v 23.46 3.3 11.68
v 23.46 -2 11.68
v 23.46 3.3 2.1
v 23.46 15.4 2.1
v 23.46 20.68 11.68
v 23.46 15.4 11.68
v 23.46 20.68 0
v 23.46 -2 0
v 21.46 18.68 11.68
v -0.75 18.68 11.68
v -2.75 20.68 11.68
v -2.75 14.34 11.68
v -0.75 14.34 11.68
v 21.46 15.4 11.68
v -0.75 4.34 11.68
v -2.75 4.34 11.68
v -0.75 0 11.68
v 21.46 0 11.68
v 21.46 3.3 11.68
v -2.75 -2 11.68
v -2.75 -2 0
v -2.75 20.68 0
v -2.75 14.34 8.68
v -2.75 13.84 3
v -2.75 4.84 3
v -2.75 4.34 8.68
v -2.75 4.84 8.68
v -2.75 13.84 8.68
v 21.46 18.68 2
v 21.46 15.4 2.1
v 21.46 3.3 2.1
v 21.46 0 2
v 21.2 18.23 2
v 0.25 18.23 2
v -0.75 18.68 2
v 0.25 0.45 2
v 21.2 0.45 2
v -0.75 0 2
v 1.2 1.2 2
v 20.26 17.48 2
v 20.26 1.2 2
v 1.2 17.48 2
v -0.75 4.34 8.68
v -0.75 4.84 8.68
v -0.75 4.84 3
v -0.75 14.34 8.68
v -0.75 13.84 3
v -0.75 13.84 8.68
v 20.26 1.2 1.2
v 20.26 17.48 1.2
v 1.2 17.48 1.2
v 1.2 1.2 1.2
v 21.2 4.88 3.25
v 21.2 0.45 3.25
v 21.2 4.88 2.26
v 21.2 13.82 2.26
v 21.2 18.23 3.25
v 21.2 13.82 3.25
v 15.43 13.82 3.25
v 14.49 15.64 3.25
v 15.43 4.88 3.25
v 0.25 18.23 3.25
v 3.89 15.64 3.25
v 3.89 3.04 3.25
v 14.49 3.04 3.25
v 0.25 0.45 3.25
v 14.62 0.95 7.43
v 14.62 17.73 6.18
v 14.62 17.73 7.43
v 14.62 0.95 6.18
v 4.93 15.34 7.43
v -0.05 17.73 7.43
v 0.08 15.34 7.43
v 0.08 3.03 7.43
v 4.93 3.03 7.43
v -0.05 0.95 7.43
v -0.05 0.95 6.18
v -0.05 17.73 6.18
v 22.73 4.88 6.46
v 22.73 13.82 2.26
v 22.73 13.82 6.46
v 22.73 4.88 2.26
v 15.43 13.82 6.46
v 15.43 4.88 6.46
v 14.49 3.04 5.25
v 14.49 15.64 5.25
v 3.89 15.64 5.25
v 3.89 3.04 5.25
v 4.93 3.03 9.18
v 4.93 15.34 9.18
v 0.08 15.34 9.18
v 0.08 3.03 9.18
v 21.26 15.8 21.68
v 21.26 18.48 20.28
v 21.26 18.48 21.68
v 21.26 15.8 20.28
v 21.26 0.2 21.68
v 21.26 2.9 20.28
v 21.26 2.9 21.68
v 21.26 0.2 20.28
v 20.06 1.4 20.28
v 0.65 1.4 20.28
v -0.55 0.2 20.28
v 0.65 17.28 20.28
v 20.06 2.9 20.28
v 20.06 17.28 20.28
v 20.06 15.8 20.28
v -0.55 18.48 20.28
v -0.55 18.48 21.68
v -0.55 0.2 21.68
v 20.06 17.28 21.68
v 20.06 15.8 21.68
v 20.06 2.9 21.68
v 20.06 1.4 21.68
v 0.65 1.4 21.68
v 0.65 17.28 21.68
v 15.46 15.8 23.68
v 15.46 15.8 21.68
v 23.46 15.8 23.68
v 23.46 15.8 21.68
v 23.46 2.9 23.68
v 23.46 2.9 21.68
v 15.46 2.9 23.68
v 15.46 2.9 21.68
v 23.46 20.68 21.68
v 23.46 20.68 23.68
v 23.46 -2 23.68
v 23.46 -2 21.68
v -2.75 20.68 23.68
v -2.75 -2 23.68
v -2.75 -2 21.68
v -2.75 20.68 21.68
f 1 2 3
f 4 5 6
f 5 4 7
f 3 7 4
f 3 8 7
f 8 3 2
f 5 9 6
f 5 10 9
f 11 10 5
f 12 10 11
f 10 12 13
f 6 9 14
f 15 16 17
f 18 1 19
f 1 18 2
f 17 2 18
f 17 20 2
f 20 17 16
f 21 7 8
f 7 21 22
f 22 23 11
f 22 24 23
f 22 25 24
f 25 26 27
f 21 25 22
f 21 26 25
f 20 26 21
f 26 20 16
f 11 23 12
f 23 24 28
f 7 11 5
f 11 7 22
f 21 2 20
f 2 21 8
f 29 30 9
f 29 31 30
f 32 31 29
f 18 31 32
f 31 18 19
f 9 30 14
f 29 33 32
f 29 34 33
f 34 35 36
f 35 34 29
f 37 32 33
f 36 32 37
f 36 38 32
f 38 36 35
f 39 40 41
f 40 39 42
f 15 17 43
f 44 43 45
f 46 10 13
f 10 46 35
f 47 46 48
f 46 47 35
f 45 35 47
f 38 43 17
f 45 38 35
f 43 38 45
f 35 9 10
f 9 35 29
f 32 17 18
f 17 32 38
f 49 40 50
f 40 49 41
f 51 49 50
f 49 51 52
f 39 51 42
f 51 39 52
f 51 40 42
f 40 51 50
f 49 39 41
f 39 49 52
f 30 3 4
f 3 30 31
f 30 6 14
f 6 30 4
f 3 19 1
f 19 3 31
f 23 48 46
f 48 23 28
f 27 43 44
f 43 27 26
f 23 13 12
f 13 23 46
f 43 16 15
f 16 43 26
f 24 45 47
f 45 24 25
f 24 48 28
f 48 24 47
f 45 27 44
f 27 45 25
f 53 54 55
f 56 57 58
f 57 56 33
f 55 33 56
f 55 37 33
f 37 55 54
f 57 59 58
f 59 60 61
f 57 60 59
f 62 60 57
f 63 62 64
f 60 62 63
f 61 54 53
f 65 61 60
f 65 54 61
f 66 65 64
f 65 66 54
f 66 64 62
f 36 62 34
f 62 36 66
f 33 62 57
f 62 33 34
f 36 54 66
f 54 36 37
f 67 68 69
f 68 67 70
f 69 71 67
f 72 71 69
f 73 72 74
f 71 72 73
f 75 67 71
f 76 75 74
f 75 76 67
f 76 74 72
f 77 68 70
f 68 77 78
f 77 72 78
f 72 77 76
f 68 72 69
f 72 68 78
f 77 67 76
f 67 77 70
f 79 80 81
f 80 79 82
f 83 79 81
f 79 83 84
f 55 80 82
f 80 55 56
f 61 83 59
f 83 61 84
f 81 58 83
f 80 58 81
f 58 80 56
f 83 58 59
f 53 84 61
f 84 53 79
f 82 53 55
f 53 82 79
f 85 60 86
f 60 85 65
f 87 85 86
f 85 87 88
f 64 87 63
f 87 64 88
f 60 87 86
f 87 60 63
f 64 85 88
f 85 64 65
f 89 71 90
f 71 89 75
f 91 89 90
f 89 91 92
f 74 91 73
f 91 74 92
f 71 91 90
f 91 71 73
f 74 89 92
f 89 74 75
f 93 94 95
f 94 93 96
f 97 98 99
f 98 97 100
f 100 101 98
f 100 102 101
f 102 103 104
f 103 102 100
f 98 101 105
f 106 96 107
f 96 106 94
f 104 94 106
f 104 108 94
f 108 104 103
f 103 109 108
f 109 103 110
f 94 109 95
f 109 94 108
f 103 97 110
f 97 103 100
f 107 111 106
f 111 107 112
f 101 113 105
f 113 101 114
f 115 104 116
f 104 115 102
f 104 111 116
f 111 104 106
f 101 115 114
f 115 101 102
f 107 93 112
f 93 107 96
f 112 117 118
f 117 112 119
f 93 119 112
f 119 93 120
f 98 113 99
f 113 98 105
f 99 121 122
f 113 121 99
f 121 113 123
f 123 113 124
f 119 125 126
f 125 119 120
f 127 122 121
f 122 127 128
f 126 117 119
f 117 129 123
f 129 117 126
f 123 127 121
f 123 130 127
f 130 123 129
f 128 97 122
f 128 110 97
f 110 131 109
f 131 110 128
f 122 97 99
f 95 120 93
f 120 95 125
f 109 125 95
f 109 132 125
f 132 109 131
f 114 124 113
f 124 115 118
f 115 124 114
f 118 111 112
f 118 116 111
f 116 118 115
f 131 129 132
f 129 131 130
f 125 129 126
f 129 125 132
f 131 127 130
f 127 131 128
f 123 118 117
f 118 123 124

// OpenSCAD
// 2026-10-16 V6.5 release: USB and SD openings each 0.6 mm wider.
// V6.4 case pocket, outline, seating height and flat tape-mount base retained.
// Prior fitted print bowed around the board; add 0.2 mm on each side.
// Print body flat base down and lid flat roof down. No underside rails.
// Ryan approved the V6.4 fit apart from tight port openings.
// V6.5 final port widening is CAD-verified; a new physical print is untested.
part = "exploded"; // body, lid, body_preview, fit_preview, assembly, exploded, collision
board_clearance = 0.25; // retain existing length clearance
extra_width = 0.40; // V6.4 adds 0.20 mm on each side of the board
rear_cable_width = 9; // +1 mm versus nearly fitting v4.3
rear_cable_bottom = 3; // 1 mm above the board's seating ledge
side_wire_exits = false; // Ryan requested cable exit opposite USB; keep sides solid
wall = 2.0;
floor_t = 2;
rail_h = 0; // flat continuous underside for mounting tape
pcb_l = 20.96;
pcb_w = 17.78;
pl = pcb_l + 2*board_clearance;
pw = pcb_w + 2*board_clearance + extra_width;
// Sense PCB overhangs the rear of the main PCB by 0.30 mm.
rear_extra = 0.75; // +0.4 mm pocket depth at cable end; PCB ledge unchanged
x0 = -wall-rear_extra;
x1 = pl+wall;
y0 = -wall;
y1 = pw+wall;
fpc_top = floor_t+6.93+0.25;
height_reduction = 1.0;
body_top = fpc_top+3.5-height_reduction;
lid_gap = 0.20; // internal locating lip clearance per side; not a snap fit
lid_t = 2;
seat_gap = 0; // roof underside rests on the body's top rim
lid_under = body_top+seat_gap;
lid_top = lid_under+lid_t;
lip_depth = 1.4; // lip bottom remains 1.1 mm above tallest reference connector
lip_wall = 1.2;
skirt_bottom = body_top-lip_depth;
usb_y = board_clearance+extra_width/2+2.78-((-10.59-1.65)/2);
usb_width = 12.1; // V6.5: +0.6 mm total, +0.3 mm per side
card_relief_width = usb_width+0.8; // V6.5: 12.9 mm, +0.6 mm total
card_access_depth = 8; // 3 mm deeper than V6.2; check physical access before bonding
usb_bottom = 2.1; // sill raised just 0.2 mm; below modeled connector bottom 2.26 mm
usb_top = 6.9;
wire_top = 6.6;
wire_ranges = [[pl/2+3.9,pl/2+8.8],[pl/2-8.8,pl/2-6.4]];
window_w = 10;
window_bottom = body_top-3;
eps = 0.02;
$fn = 40;

module body() {
  difference() {
    // Single flat-bottom shell; no feet or rails under the tape surface.
    translate([x0,y0,0]) cube([x1-x0,y1-y0,body_top]);
    // Full-depth pocket. Bottom board rests on the original perimeter ledge.
    translate([-rear_extra,0,floor_t])
      cube([pl+rear_extra,pw,body_top]);
    translate([1.2,1.2,floor_t-0.8]) cube([pl-2.4,pw-2.4,body_top]);
    // Top-open USB/card notch restores drop-in installation and card clearance.
    // V6.5 width 12.1 mm; actual card/cable access still needs a physical check.
    translate([pl-eps,usb_y-usb_width/2,usb_bottom])
      cube([wall+2*eps,usb_width,body_top]);
    // Top-open harness slots avoid threading soldered wires through closed holes.
    if(side_wire_exits) for(r=wire_ranges, side=[0,1])
      translate([r[0],side?pw-eps:y0-eps,floor_t+1])
        cube([r[1]-r[0],wall+2*eps,body_top]);
    // Rear foam inlet is an open-top notch capped by the lid (no TPU bridge).
    translate([x0-eps,(pw-window_w)/2,window_bottom])
      cube([wall+2*eps,window_w,body_top]);
    // Harness exit at -X, directly opposite the USB end. Open at the top so
    // the already-soldered recorder/harness can settle into the bottom.
    translate([x0-eps,(pw-rear_cable_width)/2,rear_cable_bottom])
      cube([wall+2*eps,rear_cable_width,body_top]);
  }
}

module lid() {
  difference() {
  union() {
    // Roof has exactly the body's outside width and length. Its underside
    // rests on the 2 mm body rim, leaving no overhanging outer skirt.
    translate([x0,y0,lid_under]) cube([x1-x0,y1-y0,lid_t]);
    // Small male locating lip fits inside the body pocket (a groove/rabbet
    // around its perimeter). Continuous rear edge: no wire slot in the lid.
    difference() {
      translate([-rear_extra+lid_gap,lid_gap,skirt_bottom])
        cube([pl+rear_extra-2*lid_gap,pw-2*lid_gap,lip_depth+eps]);
      translate([-rear_extra+lid_gap+lip_wall,lid_gap+lip_wall,skirt_bottom-eps])
        cube([pl+rear_extra-2*(lid_gap+lip_wall),pw-2*(lid_gap+lip_wall),lip_depth+3*eps]);
      // Remove the internal front lip above the USB/card notch.
      // The roof access cut below keeps the card accessible after bonding.
      translate([pl-lid_gap-lip_wall-0.3,usb_y-card_relief_width/2,skirt_bottom-eps])
        cube([wall+lid_gap+lip_wall+1,card_relief_width,lip_depth+3*eps]);
    }
    // Reference connector top is z=9.18; lip bottom is z=10.28. Actual
    // solder/wires and inserted card still require a physical clearance check.
  }
  // Through-roof, edge-open card access. Removes both roof and locating lip
  // over the card end; side shoulders and rear lip remain for location/bonding.
  translate([x1-card_access_depth,usb_y-card_relief_width/2,skirt_bottom-eps])
    cube([card_access_depth+eps,card_relief_width,lid_top-skirt_bottom+2*eps]);
  }
}

// Simplified visual board only; never included in either printable export.
module step_box(a,b,c,d,e,f) {
  translate([board_clearance+a+8.67,board_clearance+extra_width/2+2.78-f,floor_t+c+0.25])
    cube([b-a,f-e,d-c]);
}
module board() {
  color("seagreen") step_box(-8.67,12.28,-0.25,1,-15,2.78);
  color("seagreen") step_box(-8.97,5.70,3.93,5.18,-14.50,2.28);
  color("silver") step_box(6.51,13.81,0.01,4.21,-10.59,-1.65);
  color("silver") step_box(-5.03,5.57,1,3,-12.41,0.19);
  color("ivory") step_box(-8.84,-3.99,5.17,6.93,-12.11,0.20);
}
if(part=="body") translate([0,0,rail_h]) body();
if(part=="body_preview") color([0.25,0.45,0.7]) body();
if(part=="fit_preview") {
  color([0.25,0.45,0.7,0.55]) body();
  board();
}
if(part=="lid") translate([0,0,lid_top]) mirror([0,0,1]) lid();
if(part=="assembly" || part=="exploded") {
  color([0.25,0.45,0.7,0.7]) body();
  board();
  translate([0,0,part=="exploded"?10:0]) color([0.95,0.55,0.15,0.8]) lid();
}
if(part=="collision") {
  intersection(){ body(); lid(); }
  intersection(){ body(); board(); }
  intersection(){ lid(); board(); }
}
